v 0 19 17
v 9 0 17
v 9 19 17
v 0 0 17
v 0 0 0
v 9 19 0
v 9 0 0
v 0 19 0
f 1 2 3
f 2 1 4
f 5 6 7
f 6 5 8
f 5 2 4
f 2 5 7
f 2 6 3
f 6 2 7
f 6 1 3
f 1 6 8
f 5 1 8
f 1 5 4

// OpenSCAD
// Generated by SolidPython 1.0.1 on 2020-07-29 00:46:55


cube(size = [9, 19, 17]);
/***********************************************
*********      SolidPython code:      **********
************************************************
 
# import packages: SolidPython
from solid import *
from solid.utils import *
from itertools import chain, combinations, permutations


class Resize:

    def __init__(self, scad_file):
        self.scad_file = scad_file
        #self.scad_file = import_scad(scad_file)
        # cone/cylinder param:
        self.r1 = 0
        self.r2 = 0
        self.h = 0
        # rectangular prism param:
        self.w = 0
        self.l = 0
        # ellipse param:
        self.r = 0

    # import OpenScad code (file name corresponds to shape)


    # classify shape + parameters
    def assign(self, param1, param2, param3):
        if self.scad_file == 'cone.scad':
            self.r1 = param1
            self.r2 = param2
            self.h = param3
        elif self.scad_file == 'cylinder.scad':
            self.r1 = param1
            self.r2 = param2
            self.h = param3
        elif self.scad_file == 'rectangularPrism.scad':
            self.h = param1
            self.l = param2
            self.w = param3
        else:
            self.r = param1
            self.h = param2

    # resize parameters
    def iterate(self):
        x = range(3, 20, 2)
        i = 1
        if self.scad_file == 'cone.scad':
            tempList = list(permutations(x, 2))
            for temp in tempList:
                param1 = temp[0]
                param2 = temp[1]
                filepath = 'produced_scad_files/' + 'cone' + str(param1) + '_' + str(param2) + '_' + '.scad'
                scad_render_to_file(cylinder(h=param1, r1=param2, r2=0), filepath)

        elif self.scad_file == 'cylinder.scad':
            tempList = list(permutations(x, 3))
            for temp in tempList:
                param1 = temp[0]
                param2 = temp[1]
                filepath = 'produced_scad_files/' + 'cylinder' + str(param1) + '_' + str(param2) + '_' + '.scad'
                scad_render_to_file(cylinder(h=param1, r1=param2, r2=param2), filepath)

        elif self.scad_file == 'rectangularPrism.scad':
            tempList = list(permutations(x, 3))
            for temp in tempList:
                param1 = temp[0]
                param2 = temp[1]
                param3 = temp[2]
                filepath = 'produced_scad_files/' + 'rectangularPrism' + str(param1) + '_' + str(param2) + '_' + str(
                    param3) + '.scad'
                scad_render_to_file(cube(size=(param1, param2, param3)), filepath)

        elif self.scad_file == 'ellipse.scad':
            tempList = list(permutations(x, 4))
            for temp in tempList:
                param1 = temp[0]
                param2 = temp[1]
                param3 = temp[2]
                param4 = temp[3]
                filepath = 'produced_scad_files/' + 'ellipse' + str(param1) + '_' + str(param2) + '_' + str(param3) + '_' + str(param4) + '.scad'
                scad_render_to_file(scale([param1, param2, param3])(sphere(r=param4)), filepath)

    def render_to_scadfile(self):
        scad_render_to_file(scad, 'example.scad') 
 
************************************************/
